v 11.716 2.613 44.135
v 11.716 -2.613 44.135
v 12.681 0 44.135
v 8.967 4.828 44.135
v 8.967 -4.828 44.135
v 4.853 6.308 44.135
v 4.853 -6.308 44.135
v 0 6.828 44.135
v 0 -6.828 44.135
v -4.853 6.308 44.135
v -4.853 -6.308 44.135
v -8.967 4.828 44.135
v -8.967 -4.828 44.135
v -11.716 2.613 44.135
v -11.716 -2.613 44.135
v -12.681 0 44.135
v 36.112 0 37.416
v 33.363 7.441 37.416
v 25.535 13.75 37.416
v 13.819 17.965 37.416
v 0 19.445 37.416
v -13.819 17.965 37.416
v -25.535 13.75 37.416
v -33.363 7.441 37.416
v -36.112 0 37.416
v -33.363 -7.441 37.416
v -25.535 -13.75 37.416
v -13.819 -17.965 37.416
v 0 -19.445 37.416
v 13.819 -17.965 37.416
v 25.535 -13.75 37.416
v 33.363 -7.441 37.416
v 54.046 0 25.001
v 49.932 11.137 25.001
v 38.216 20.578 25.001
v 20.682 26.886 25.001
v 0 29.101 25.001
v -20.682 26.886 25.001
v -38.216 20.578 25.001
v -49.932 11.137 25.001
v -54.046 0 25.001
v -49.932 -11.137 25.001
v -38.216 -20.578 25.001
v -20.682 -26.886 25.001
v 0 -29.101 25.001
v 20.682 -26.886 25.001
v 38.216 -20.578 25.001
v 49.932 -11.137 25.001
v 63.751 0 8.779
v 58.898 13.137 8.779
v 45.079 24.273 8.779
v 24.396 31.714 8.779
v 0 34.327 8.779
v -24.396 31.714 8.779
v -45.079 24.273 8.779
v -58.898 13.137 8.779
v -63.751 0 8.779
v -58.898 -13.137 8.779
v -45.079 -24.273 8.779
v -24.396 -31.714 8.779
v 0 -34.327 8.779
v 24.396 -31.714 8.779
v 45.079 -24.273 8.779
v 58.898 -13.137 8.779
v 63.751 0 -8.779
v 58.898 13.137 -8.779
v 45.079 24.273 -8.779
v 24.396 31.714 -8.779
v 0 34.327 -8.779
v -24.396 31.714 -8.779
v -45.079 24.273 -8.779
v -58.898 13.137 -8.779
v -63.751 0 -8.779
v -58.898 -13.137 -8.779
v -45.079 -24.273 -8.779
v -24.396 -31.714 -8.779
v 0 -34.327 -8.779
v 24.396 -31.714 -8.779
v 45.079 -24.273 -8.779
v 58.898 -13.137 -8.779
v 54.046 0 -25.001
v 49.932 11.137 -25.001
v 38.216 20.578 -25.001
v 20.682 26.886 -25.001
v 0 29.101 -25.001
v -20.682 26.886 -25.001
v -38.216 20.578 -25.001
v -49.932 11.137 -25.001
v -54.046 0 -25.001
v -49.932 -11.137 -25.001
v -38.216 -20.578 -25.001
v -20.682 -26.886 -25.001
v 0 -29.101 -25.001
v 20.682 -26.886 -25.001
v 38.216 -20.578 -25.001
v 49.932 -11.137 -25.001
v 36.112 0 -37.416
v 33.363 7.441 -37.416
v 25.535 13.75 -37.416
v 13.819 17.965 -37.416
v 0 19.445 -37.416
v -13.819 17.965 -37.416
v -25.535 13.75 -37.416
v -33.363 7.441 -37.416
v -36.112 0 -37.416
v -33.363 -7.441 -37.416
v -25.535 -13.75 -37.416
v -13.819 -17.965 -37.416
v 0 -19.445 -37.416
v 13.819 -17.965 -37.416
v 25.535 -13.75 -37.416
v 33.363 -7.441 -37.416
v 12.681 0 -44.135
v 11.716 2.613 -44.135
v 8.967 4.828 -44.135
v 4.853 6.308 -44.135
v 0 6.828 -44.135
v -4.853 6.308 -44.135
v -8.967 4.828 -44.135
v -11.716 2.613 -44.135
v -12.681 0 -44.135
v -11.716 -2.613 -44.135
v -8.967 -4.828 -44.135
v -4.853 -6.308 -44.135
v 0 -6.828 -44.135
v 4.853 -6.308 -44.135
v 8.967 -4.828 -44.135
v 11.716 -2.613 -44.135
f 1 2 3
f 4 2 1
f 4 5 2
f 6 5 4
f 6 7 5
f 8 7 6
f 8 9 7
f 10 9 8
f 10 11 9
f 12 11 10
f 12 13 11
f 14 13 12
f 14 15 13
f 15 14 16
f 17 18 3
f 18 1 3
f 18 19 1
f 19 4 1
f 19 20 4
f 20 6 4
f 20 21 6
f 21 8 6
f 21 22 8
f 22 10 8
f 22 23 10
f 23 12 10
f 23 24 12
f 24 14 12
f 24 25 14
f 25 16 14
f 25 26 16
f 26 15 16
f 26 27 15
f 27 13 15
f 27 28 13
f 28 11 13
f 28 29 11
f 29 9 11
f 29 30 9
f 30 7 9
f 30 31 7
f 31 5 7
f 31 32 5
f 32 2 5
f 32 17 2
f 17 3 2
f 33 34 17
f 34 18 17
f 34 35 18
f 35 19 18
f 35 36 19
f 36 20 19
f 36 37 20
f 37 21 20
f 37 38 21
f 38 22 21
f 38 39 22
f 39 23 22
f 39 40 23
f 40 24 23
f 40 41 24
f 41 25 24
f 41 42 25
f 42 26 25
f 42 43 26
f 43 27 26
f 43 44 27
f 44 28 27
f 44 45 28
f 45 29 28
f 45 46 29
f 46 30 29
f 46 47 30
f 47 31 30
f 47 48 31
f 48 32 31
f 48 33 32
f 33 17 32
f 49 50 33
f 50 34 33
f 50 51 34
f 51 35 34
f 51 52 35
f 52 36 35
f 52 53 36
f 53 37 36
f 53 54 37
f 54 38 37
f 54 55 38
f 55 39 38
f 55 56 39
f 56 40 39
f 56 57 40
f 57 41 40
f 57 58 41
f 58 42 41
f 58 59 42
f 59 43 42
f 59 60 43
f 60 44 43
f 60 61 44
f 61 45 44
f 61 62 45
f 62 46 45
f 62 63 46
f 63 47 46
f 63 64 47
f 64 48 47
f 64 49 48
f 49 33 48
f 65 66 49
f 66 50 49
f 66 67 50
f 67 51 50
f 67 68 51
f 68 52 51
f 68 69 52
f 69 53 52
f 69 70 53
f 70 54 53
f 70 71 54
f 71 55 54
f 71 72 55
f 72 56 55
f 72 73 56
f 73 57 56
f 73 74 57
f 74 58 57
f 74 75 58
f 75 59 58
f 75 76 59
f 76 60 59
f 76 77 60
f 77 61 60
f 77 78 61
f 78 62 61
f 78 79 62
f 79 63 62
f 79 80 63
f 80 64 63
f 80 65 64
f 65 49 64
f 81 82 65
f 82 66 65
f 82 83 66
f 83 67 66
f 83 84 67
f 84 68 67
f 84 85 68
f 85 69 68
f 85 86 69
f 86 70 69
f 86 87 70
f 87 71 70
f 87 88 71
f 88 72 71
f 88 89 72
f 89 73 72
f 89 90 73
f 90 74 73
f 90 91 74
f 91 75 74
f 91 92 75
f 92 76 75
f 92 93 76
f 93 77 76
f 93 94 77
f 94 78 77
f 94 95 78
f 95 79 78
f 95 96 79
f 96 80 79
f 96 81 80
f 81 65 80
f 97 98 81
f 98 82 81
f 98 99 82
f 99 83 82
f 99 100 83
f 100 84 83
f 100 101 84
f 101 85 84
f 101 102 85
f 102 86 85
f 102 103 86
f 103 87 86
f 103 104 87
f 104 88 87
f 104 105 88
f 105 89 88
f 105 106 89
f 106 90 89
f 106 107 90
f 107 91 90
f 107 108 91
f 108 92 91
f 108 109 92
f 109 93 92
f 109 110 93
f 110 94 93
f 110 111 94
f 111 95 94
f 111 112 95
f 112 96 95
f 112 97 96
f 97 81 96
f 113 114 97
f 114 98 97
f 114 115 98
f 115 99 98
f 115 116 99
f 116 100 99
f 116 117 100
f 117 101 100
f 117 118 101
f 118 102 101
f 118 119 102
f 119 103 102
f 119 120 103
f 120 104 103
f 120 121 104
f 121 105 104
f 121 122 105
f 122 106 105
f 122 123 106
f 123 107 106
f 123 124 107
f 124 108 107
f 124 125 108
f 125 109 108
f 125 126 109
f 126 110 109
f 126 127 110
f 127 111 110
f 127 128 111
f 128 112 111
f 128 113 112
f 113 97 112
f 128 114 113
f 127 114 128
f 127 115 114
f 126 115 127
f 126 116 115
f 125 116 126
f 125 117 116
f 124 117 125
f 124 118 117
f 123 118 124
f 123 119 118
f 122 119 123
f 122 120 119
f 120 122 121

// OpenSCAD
// Generated by SolidPython 1.0.1 on 2020-07-29 00:46:50


scale(v = [13, 7, 9]) {
	sphere(r = 5);
}
/***********************************************
*********      SolidPython code:      **********
************************************************
 
# import packages: SolidPython
from solid import *
from solid.utils import *
from itertools import chain, combinations, permutations


class Resize:

    def __init__(self, scad_file):
        self.scad_file = scad_file
        #self.scad_file = import_scad(scad_file)
        # cone/cylinder param:
        self.r1 = 0
        self.r2 = 0
        self.h = 0
        # rectangular prism param:
        self.w = 0
        self.l = 0
        # ellipse param:
        self.r = 0

    # import OpenScad code (file name corresponds to shape)


    # classify shape + parameters
    def assign(self, param1, param2, param3):
        if self.scad_file == 'cone.scad':
            self.r1 = param1
            self.r2 = param2
            self.h = param3
        elif self.scad_file == 'cylinder.scad':
            self.r1 = param1
            self.r2 = param2
            self.h = param3
        elif self.scad_file == 'rectangularPrism.scad':
            self.h = param1
            self.l = param2
            self.w = param3
        else:
            self.r = param1
            self.h = param2

    # resize parameters
    def iterate(self):
        x = range(3, 20, 2)
        i = 1
        if self.scad_file == 'cone.scad':
            tempList = list(permutations(x, 2))
            for temp in tempList:
                param1 = temp[0]
                param2 = temp[1]
                filepath = 'produced_scad_files/' + 'cone' + str(param1) + '_' + str(param2) + '_' + '.scad'
                scad_render_to_file(cylinder(h=param1, r1=param2, r2=0), filepath)

        elif self.scad_file == 'cylinder.scad':
            tempList = list(permutations(x, 3))
            for temp in tempList:
                param1 = temp[0]
                param2 = temp[1]
                filepath = 'produced_scad_files/' + 'cylinder' + str(param1) + '_' + str(param2) + '_' + '.scad'
                scad_render_to_file(cylinder(h=param1, r1=param2, r2=param2), filepath)

        elif self.scad_file == 'rectangularPrism.scad':
            tempList = list(permutations(x, 3))
            for temp in tempList:
                param1 = temp[0]
                param2 = temp[1]
                param3 = temp[2]
                filepath = 'produced_scad_files/' + 'rectangularPrism' + str(param1) + '_' + str(param2) + '_' + str(
                    param3) + '.scad'
                scad_render_to_file(cube(size=(param1, param2, param3)), filepath)

        elif self.scad_file == 'ellipse.scad':
            tempList = list(permutations(x, 4))
            for temp in tempList:
                param1 = temp[0]
                param2 = temp[1]
                param3 = temp[2]
                param4 = temp[3]
                filepath = 'produced_scad_files/' + 'ellipse' + str(param1) + '_' + str(param2) + '_' + str(param3) + '_' + str(param4) + '.scad'
                scad_render_to_file(scale([param1, param2, param3])(sphere(r=param4)), filepath)

    def render_to_scadfile(self):
        scad_render_to_file(scad, 'example.scad') 
 
************************************************/
